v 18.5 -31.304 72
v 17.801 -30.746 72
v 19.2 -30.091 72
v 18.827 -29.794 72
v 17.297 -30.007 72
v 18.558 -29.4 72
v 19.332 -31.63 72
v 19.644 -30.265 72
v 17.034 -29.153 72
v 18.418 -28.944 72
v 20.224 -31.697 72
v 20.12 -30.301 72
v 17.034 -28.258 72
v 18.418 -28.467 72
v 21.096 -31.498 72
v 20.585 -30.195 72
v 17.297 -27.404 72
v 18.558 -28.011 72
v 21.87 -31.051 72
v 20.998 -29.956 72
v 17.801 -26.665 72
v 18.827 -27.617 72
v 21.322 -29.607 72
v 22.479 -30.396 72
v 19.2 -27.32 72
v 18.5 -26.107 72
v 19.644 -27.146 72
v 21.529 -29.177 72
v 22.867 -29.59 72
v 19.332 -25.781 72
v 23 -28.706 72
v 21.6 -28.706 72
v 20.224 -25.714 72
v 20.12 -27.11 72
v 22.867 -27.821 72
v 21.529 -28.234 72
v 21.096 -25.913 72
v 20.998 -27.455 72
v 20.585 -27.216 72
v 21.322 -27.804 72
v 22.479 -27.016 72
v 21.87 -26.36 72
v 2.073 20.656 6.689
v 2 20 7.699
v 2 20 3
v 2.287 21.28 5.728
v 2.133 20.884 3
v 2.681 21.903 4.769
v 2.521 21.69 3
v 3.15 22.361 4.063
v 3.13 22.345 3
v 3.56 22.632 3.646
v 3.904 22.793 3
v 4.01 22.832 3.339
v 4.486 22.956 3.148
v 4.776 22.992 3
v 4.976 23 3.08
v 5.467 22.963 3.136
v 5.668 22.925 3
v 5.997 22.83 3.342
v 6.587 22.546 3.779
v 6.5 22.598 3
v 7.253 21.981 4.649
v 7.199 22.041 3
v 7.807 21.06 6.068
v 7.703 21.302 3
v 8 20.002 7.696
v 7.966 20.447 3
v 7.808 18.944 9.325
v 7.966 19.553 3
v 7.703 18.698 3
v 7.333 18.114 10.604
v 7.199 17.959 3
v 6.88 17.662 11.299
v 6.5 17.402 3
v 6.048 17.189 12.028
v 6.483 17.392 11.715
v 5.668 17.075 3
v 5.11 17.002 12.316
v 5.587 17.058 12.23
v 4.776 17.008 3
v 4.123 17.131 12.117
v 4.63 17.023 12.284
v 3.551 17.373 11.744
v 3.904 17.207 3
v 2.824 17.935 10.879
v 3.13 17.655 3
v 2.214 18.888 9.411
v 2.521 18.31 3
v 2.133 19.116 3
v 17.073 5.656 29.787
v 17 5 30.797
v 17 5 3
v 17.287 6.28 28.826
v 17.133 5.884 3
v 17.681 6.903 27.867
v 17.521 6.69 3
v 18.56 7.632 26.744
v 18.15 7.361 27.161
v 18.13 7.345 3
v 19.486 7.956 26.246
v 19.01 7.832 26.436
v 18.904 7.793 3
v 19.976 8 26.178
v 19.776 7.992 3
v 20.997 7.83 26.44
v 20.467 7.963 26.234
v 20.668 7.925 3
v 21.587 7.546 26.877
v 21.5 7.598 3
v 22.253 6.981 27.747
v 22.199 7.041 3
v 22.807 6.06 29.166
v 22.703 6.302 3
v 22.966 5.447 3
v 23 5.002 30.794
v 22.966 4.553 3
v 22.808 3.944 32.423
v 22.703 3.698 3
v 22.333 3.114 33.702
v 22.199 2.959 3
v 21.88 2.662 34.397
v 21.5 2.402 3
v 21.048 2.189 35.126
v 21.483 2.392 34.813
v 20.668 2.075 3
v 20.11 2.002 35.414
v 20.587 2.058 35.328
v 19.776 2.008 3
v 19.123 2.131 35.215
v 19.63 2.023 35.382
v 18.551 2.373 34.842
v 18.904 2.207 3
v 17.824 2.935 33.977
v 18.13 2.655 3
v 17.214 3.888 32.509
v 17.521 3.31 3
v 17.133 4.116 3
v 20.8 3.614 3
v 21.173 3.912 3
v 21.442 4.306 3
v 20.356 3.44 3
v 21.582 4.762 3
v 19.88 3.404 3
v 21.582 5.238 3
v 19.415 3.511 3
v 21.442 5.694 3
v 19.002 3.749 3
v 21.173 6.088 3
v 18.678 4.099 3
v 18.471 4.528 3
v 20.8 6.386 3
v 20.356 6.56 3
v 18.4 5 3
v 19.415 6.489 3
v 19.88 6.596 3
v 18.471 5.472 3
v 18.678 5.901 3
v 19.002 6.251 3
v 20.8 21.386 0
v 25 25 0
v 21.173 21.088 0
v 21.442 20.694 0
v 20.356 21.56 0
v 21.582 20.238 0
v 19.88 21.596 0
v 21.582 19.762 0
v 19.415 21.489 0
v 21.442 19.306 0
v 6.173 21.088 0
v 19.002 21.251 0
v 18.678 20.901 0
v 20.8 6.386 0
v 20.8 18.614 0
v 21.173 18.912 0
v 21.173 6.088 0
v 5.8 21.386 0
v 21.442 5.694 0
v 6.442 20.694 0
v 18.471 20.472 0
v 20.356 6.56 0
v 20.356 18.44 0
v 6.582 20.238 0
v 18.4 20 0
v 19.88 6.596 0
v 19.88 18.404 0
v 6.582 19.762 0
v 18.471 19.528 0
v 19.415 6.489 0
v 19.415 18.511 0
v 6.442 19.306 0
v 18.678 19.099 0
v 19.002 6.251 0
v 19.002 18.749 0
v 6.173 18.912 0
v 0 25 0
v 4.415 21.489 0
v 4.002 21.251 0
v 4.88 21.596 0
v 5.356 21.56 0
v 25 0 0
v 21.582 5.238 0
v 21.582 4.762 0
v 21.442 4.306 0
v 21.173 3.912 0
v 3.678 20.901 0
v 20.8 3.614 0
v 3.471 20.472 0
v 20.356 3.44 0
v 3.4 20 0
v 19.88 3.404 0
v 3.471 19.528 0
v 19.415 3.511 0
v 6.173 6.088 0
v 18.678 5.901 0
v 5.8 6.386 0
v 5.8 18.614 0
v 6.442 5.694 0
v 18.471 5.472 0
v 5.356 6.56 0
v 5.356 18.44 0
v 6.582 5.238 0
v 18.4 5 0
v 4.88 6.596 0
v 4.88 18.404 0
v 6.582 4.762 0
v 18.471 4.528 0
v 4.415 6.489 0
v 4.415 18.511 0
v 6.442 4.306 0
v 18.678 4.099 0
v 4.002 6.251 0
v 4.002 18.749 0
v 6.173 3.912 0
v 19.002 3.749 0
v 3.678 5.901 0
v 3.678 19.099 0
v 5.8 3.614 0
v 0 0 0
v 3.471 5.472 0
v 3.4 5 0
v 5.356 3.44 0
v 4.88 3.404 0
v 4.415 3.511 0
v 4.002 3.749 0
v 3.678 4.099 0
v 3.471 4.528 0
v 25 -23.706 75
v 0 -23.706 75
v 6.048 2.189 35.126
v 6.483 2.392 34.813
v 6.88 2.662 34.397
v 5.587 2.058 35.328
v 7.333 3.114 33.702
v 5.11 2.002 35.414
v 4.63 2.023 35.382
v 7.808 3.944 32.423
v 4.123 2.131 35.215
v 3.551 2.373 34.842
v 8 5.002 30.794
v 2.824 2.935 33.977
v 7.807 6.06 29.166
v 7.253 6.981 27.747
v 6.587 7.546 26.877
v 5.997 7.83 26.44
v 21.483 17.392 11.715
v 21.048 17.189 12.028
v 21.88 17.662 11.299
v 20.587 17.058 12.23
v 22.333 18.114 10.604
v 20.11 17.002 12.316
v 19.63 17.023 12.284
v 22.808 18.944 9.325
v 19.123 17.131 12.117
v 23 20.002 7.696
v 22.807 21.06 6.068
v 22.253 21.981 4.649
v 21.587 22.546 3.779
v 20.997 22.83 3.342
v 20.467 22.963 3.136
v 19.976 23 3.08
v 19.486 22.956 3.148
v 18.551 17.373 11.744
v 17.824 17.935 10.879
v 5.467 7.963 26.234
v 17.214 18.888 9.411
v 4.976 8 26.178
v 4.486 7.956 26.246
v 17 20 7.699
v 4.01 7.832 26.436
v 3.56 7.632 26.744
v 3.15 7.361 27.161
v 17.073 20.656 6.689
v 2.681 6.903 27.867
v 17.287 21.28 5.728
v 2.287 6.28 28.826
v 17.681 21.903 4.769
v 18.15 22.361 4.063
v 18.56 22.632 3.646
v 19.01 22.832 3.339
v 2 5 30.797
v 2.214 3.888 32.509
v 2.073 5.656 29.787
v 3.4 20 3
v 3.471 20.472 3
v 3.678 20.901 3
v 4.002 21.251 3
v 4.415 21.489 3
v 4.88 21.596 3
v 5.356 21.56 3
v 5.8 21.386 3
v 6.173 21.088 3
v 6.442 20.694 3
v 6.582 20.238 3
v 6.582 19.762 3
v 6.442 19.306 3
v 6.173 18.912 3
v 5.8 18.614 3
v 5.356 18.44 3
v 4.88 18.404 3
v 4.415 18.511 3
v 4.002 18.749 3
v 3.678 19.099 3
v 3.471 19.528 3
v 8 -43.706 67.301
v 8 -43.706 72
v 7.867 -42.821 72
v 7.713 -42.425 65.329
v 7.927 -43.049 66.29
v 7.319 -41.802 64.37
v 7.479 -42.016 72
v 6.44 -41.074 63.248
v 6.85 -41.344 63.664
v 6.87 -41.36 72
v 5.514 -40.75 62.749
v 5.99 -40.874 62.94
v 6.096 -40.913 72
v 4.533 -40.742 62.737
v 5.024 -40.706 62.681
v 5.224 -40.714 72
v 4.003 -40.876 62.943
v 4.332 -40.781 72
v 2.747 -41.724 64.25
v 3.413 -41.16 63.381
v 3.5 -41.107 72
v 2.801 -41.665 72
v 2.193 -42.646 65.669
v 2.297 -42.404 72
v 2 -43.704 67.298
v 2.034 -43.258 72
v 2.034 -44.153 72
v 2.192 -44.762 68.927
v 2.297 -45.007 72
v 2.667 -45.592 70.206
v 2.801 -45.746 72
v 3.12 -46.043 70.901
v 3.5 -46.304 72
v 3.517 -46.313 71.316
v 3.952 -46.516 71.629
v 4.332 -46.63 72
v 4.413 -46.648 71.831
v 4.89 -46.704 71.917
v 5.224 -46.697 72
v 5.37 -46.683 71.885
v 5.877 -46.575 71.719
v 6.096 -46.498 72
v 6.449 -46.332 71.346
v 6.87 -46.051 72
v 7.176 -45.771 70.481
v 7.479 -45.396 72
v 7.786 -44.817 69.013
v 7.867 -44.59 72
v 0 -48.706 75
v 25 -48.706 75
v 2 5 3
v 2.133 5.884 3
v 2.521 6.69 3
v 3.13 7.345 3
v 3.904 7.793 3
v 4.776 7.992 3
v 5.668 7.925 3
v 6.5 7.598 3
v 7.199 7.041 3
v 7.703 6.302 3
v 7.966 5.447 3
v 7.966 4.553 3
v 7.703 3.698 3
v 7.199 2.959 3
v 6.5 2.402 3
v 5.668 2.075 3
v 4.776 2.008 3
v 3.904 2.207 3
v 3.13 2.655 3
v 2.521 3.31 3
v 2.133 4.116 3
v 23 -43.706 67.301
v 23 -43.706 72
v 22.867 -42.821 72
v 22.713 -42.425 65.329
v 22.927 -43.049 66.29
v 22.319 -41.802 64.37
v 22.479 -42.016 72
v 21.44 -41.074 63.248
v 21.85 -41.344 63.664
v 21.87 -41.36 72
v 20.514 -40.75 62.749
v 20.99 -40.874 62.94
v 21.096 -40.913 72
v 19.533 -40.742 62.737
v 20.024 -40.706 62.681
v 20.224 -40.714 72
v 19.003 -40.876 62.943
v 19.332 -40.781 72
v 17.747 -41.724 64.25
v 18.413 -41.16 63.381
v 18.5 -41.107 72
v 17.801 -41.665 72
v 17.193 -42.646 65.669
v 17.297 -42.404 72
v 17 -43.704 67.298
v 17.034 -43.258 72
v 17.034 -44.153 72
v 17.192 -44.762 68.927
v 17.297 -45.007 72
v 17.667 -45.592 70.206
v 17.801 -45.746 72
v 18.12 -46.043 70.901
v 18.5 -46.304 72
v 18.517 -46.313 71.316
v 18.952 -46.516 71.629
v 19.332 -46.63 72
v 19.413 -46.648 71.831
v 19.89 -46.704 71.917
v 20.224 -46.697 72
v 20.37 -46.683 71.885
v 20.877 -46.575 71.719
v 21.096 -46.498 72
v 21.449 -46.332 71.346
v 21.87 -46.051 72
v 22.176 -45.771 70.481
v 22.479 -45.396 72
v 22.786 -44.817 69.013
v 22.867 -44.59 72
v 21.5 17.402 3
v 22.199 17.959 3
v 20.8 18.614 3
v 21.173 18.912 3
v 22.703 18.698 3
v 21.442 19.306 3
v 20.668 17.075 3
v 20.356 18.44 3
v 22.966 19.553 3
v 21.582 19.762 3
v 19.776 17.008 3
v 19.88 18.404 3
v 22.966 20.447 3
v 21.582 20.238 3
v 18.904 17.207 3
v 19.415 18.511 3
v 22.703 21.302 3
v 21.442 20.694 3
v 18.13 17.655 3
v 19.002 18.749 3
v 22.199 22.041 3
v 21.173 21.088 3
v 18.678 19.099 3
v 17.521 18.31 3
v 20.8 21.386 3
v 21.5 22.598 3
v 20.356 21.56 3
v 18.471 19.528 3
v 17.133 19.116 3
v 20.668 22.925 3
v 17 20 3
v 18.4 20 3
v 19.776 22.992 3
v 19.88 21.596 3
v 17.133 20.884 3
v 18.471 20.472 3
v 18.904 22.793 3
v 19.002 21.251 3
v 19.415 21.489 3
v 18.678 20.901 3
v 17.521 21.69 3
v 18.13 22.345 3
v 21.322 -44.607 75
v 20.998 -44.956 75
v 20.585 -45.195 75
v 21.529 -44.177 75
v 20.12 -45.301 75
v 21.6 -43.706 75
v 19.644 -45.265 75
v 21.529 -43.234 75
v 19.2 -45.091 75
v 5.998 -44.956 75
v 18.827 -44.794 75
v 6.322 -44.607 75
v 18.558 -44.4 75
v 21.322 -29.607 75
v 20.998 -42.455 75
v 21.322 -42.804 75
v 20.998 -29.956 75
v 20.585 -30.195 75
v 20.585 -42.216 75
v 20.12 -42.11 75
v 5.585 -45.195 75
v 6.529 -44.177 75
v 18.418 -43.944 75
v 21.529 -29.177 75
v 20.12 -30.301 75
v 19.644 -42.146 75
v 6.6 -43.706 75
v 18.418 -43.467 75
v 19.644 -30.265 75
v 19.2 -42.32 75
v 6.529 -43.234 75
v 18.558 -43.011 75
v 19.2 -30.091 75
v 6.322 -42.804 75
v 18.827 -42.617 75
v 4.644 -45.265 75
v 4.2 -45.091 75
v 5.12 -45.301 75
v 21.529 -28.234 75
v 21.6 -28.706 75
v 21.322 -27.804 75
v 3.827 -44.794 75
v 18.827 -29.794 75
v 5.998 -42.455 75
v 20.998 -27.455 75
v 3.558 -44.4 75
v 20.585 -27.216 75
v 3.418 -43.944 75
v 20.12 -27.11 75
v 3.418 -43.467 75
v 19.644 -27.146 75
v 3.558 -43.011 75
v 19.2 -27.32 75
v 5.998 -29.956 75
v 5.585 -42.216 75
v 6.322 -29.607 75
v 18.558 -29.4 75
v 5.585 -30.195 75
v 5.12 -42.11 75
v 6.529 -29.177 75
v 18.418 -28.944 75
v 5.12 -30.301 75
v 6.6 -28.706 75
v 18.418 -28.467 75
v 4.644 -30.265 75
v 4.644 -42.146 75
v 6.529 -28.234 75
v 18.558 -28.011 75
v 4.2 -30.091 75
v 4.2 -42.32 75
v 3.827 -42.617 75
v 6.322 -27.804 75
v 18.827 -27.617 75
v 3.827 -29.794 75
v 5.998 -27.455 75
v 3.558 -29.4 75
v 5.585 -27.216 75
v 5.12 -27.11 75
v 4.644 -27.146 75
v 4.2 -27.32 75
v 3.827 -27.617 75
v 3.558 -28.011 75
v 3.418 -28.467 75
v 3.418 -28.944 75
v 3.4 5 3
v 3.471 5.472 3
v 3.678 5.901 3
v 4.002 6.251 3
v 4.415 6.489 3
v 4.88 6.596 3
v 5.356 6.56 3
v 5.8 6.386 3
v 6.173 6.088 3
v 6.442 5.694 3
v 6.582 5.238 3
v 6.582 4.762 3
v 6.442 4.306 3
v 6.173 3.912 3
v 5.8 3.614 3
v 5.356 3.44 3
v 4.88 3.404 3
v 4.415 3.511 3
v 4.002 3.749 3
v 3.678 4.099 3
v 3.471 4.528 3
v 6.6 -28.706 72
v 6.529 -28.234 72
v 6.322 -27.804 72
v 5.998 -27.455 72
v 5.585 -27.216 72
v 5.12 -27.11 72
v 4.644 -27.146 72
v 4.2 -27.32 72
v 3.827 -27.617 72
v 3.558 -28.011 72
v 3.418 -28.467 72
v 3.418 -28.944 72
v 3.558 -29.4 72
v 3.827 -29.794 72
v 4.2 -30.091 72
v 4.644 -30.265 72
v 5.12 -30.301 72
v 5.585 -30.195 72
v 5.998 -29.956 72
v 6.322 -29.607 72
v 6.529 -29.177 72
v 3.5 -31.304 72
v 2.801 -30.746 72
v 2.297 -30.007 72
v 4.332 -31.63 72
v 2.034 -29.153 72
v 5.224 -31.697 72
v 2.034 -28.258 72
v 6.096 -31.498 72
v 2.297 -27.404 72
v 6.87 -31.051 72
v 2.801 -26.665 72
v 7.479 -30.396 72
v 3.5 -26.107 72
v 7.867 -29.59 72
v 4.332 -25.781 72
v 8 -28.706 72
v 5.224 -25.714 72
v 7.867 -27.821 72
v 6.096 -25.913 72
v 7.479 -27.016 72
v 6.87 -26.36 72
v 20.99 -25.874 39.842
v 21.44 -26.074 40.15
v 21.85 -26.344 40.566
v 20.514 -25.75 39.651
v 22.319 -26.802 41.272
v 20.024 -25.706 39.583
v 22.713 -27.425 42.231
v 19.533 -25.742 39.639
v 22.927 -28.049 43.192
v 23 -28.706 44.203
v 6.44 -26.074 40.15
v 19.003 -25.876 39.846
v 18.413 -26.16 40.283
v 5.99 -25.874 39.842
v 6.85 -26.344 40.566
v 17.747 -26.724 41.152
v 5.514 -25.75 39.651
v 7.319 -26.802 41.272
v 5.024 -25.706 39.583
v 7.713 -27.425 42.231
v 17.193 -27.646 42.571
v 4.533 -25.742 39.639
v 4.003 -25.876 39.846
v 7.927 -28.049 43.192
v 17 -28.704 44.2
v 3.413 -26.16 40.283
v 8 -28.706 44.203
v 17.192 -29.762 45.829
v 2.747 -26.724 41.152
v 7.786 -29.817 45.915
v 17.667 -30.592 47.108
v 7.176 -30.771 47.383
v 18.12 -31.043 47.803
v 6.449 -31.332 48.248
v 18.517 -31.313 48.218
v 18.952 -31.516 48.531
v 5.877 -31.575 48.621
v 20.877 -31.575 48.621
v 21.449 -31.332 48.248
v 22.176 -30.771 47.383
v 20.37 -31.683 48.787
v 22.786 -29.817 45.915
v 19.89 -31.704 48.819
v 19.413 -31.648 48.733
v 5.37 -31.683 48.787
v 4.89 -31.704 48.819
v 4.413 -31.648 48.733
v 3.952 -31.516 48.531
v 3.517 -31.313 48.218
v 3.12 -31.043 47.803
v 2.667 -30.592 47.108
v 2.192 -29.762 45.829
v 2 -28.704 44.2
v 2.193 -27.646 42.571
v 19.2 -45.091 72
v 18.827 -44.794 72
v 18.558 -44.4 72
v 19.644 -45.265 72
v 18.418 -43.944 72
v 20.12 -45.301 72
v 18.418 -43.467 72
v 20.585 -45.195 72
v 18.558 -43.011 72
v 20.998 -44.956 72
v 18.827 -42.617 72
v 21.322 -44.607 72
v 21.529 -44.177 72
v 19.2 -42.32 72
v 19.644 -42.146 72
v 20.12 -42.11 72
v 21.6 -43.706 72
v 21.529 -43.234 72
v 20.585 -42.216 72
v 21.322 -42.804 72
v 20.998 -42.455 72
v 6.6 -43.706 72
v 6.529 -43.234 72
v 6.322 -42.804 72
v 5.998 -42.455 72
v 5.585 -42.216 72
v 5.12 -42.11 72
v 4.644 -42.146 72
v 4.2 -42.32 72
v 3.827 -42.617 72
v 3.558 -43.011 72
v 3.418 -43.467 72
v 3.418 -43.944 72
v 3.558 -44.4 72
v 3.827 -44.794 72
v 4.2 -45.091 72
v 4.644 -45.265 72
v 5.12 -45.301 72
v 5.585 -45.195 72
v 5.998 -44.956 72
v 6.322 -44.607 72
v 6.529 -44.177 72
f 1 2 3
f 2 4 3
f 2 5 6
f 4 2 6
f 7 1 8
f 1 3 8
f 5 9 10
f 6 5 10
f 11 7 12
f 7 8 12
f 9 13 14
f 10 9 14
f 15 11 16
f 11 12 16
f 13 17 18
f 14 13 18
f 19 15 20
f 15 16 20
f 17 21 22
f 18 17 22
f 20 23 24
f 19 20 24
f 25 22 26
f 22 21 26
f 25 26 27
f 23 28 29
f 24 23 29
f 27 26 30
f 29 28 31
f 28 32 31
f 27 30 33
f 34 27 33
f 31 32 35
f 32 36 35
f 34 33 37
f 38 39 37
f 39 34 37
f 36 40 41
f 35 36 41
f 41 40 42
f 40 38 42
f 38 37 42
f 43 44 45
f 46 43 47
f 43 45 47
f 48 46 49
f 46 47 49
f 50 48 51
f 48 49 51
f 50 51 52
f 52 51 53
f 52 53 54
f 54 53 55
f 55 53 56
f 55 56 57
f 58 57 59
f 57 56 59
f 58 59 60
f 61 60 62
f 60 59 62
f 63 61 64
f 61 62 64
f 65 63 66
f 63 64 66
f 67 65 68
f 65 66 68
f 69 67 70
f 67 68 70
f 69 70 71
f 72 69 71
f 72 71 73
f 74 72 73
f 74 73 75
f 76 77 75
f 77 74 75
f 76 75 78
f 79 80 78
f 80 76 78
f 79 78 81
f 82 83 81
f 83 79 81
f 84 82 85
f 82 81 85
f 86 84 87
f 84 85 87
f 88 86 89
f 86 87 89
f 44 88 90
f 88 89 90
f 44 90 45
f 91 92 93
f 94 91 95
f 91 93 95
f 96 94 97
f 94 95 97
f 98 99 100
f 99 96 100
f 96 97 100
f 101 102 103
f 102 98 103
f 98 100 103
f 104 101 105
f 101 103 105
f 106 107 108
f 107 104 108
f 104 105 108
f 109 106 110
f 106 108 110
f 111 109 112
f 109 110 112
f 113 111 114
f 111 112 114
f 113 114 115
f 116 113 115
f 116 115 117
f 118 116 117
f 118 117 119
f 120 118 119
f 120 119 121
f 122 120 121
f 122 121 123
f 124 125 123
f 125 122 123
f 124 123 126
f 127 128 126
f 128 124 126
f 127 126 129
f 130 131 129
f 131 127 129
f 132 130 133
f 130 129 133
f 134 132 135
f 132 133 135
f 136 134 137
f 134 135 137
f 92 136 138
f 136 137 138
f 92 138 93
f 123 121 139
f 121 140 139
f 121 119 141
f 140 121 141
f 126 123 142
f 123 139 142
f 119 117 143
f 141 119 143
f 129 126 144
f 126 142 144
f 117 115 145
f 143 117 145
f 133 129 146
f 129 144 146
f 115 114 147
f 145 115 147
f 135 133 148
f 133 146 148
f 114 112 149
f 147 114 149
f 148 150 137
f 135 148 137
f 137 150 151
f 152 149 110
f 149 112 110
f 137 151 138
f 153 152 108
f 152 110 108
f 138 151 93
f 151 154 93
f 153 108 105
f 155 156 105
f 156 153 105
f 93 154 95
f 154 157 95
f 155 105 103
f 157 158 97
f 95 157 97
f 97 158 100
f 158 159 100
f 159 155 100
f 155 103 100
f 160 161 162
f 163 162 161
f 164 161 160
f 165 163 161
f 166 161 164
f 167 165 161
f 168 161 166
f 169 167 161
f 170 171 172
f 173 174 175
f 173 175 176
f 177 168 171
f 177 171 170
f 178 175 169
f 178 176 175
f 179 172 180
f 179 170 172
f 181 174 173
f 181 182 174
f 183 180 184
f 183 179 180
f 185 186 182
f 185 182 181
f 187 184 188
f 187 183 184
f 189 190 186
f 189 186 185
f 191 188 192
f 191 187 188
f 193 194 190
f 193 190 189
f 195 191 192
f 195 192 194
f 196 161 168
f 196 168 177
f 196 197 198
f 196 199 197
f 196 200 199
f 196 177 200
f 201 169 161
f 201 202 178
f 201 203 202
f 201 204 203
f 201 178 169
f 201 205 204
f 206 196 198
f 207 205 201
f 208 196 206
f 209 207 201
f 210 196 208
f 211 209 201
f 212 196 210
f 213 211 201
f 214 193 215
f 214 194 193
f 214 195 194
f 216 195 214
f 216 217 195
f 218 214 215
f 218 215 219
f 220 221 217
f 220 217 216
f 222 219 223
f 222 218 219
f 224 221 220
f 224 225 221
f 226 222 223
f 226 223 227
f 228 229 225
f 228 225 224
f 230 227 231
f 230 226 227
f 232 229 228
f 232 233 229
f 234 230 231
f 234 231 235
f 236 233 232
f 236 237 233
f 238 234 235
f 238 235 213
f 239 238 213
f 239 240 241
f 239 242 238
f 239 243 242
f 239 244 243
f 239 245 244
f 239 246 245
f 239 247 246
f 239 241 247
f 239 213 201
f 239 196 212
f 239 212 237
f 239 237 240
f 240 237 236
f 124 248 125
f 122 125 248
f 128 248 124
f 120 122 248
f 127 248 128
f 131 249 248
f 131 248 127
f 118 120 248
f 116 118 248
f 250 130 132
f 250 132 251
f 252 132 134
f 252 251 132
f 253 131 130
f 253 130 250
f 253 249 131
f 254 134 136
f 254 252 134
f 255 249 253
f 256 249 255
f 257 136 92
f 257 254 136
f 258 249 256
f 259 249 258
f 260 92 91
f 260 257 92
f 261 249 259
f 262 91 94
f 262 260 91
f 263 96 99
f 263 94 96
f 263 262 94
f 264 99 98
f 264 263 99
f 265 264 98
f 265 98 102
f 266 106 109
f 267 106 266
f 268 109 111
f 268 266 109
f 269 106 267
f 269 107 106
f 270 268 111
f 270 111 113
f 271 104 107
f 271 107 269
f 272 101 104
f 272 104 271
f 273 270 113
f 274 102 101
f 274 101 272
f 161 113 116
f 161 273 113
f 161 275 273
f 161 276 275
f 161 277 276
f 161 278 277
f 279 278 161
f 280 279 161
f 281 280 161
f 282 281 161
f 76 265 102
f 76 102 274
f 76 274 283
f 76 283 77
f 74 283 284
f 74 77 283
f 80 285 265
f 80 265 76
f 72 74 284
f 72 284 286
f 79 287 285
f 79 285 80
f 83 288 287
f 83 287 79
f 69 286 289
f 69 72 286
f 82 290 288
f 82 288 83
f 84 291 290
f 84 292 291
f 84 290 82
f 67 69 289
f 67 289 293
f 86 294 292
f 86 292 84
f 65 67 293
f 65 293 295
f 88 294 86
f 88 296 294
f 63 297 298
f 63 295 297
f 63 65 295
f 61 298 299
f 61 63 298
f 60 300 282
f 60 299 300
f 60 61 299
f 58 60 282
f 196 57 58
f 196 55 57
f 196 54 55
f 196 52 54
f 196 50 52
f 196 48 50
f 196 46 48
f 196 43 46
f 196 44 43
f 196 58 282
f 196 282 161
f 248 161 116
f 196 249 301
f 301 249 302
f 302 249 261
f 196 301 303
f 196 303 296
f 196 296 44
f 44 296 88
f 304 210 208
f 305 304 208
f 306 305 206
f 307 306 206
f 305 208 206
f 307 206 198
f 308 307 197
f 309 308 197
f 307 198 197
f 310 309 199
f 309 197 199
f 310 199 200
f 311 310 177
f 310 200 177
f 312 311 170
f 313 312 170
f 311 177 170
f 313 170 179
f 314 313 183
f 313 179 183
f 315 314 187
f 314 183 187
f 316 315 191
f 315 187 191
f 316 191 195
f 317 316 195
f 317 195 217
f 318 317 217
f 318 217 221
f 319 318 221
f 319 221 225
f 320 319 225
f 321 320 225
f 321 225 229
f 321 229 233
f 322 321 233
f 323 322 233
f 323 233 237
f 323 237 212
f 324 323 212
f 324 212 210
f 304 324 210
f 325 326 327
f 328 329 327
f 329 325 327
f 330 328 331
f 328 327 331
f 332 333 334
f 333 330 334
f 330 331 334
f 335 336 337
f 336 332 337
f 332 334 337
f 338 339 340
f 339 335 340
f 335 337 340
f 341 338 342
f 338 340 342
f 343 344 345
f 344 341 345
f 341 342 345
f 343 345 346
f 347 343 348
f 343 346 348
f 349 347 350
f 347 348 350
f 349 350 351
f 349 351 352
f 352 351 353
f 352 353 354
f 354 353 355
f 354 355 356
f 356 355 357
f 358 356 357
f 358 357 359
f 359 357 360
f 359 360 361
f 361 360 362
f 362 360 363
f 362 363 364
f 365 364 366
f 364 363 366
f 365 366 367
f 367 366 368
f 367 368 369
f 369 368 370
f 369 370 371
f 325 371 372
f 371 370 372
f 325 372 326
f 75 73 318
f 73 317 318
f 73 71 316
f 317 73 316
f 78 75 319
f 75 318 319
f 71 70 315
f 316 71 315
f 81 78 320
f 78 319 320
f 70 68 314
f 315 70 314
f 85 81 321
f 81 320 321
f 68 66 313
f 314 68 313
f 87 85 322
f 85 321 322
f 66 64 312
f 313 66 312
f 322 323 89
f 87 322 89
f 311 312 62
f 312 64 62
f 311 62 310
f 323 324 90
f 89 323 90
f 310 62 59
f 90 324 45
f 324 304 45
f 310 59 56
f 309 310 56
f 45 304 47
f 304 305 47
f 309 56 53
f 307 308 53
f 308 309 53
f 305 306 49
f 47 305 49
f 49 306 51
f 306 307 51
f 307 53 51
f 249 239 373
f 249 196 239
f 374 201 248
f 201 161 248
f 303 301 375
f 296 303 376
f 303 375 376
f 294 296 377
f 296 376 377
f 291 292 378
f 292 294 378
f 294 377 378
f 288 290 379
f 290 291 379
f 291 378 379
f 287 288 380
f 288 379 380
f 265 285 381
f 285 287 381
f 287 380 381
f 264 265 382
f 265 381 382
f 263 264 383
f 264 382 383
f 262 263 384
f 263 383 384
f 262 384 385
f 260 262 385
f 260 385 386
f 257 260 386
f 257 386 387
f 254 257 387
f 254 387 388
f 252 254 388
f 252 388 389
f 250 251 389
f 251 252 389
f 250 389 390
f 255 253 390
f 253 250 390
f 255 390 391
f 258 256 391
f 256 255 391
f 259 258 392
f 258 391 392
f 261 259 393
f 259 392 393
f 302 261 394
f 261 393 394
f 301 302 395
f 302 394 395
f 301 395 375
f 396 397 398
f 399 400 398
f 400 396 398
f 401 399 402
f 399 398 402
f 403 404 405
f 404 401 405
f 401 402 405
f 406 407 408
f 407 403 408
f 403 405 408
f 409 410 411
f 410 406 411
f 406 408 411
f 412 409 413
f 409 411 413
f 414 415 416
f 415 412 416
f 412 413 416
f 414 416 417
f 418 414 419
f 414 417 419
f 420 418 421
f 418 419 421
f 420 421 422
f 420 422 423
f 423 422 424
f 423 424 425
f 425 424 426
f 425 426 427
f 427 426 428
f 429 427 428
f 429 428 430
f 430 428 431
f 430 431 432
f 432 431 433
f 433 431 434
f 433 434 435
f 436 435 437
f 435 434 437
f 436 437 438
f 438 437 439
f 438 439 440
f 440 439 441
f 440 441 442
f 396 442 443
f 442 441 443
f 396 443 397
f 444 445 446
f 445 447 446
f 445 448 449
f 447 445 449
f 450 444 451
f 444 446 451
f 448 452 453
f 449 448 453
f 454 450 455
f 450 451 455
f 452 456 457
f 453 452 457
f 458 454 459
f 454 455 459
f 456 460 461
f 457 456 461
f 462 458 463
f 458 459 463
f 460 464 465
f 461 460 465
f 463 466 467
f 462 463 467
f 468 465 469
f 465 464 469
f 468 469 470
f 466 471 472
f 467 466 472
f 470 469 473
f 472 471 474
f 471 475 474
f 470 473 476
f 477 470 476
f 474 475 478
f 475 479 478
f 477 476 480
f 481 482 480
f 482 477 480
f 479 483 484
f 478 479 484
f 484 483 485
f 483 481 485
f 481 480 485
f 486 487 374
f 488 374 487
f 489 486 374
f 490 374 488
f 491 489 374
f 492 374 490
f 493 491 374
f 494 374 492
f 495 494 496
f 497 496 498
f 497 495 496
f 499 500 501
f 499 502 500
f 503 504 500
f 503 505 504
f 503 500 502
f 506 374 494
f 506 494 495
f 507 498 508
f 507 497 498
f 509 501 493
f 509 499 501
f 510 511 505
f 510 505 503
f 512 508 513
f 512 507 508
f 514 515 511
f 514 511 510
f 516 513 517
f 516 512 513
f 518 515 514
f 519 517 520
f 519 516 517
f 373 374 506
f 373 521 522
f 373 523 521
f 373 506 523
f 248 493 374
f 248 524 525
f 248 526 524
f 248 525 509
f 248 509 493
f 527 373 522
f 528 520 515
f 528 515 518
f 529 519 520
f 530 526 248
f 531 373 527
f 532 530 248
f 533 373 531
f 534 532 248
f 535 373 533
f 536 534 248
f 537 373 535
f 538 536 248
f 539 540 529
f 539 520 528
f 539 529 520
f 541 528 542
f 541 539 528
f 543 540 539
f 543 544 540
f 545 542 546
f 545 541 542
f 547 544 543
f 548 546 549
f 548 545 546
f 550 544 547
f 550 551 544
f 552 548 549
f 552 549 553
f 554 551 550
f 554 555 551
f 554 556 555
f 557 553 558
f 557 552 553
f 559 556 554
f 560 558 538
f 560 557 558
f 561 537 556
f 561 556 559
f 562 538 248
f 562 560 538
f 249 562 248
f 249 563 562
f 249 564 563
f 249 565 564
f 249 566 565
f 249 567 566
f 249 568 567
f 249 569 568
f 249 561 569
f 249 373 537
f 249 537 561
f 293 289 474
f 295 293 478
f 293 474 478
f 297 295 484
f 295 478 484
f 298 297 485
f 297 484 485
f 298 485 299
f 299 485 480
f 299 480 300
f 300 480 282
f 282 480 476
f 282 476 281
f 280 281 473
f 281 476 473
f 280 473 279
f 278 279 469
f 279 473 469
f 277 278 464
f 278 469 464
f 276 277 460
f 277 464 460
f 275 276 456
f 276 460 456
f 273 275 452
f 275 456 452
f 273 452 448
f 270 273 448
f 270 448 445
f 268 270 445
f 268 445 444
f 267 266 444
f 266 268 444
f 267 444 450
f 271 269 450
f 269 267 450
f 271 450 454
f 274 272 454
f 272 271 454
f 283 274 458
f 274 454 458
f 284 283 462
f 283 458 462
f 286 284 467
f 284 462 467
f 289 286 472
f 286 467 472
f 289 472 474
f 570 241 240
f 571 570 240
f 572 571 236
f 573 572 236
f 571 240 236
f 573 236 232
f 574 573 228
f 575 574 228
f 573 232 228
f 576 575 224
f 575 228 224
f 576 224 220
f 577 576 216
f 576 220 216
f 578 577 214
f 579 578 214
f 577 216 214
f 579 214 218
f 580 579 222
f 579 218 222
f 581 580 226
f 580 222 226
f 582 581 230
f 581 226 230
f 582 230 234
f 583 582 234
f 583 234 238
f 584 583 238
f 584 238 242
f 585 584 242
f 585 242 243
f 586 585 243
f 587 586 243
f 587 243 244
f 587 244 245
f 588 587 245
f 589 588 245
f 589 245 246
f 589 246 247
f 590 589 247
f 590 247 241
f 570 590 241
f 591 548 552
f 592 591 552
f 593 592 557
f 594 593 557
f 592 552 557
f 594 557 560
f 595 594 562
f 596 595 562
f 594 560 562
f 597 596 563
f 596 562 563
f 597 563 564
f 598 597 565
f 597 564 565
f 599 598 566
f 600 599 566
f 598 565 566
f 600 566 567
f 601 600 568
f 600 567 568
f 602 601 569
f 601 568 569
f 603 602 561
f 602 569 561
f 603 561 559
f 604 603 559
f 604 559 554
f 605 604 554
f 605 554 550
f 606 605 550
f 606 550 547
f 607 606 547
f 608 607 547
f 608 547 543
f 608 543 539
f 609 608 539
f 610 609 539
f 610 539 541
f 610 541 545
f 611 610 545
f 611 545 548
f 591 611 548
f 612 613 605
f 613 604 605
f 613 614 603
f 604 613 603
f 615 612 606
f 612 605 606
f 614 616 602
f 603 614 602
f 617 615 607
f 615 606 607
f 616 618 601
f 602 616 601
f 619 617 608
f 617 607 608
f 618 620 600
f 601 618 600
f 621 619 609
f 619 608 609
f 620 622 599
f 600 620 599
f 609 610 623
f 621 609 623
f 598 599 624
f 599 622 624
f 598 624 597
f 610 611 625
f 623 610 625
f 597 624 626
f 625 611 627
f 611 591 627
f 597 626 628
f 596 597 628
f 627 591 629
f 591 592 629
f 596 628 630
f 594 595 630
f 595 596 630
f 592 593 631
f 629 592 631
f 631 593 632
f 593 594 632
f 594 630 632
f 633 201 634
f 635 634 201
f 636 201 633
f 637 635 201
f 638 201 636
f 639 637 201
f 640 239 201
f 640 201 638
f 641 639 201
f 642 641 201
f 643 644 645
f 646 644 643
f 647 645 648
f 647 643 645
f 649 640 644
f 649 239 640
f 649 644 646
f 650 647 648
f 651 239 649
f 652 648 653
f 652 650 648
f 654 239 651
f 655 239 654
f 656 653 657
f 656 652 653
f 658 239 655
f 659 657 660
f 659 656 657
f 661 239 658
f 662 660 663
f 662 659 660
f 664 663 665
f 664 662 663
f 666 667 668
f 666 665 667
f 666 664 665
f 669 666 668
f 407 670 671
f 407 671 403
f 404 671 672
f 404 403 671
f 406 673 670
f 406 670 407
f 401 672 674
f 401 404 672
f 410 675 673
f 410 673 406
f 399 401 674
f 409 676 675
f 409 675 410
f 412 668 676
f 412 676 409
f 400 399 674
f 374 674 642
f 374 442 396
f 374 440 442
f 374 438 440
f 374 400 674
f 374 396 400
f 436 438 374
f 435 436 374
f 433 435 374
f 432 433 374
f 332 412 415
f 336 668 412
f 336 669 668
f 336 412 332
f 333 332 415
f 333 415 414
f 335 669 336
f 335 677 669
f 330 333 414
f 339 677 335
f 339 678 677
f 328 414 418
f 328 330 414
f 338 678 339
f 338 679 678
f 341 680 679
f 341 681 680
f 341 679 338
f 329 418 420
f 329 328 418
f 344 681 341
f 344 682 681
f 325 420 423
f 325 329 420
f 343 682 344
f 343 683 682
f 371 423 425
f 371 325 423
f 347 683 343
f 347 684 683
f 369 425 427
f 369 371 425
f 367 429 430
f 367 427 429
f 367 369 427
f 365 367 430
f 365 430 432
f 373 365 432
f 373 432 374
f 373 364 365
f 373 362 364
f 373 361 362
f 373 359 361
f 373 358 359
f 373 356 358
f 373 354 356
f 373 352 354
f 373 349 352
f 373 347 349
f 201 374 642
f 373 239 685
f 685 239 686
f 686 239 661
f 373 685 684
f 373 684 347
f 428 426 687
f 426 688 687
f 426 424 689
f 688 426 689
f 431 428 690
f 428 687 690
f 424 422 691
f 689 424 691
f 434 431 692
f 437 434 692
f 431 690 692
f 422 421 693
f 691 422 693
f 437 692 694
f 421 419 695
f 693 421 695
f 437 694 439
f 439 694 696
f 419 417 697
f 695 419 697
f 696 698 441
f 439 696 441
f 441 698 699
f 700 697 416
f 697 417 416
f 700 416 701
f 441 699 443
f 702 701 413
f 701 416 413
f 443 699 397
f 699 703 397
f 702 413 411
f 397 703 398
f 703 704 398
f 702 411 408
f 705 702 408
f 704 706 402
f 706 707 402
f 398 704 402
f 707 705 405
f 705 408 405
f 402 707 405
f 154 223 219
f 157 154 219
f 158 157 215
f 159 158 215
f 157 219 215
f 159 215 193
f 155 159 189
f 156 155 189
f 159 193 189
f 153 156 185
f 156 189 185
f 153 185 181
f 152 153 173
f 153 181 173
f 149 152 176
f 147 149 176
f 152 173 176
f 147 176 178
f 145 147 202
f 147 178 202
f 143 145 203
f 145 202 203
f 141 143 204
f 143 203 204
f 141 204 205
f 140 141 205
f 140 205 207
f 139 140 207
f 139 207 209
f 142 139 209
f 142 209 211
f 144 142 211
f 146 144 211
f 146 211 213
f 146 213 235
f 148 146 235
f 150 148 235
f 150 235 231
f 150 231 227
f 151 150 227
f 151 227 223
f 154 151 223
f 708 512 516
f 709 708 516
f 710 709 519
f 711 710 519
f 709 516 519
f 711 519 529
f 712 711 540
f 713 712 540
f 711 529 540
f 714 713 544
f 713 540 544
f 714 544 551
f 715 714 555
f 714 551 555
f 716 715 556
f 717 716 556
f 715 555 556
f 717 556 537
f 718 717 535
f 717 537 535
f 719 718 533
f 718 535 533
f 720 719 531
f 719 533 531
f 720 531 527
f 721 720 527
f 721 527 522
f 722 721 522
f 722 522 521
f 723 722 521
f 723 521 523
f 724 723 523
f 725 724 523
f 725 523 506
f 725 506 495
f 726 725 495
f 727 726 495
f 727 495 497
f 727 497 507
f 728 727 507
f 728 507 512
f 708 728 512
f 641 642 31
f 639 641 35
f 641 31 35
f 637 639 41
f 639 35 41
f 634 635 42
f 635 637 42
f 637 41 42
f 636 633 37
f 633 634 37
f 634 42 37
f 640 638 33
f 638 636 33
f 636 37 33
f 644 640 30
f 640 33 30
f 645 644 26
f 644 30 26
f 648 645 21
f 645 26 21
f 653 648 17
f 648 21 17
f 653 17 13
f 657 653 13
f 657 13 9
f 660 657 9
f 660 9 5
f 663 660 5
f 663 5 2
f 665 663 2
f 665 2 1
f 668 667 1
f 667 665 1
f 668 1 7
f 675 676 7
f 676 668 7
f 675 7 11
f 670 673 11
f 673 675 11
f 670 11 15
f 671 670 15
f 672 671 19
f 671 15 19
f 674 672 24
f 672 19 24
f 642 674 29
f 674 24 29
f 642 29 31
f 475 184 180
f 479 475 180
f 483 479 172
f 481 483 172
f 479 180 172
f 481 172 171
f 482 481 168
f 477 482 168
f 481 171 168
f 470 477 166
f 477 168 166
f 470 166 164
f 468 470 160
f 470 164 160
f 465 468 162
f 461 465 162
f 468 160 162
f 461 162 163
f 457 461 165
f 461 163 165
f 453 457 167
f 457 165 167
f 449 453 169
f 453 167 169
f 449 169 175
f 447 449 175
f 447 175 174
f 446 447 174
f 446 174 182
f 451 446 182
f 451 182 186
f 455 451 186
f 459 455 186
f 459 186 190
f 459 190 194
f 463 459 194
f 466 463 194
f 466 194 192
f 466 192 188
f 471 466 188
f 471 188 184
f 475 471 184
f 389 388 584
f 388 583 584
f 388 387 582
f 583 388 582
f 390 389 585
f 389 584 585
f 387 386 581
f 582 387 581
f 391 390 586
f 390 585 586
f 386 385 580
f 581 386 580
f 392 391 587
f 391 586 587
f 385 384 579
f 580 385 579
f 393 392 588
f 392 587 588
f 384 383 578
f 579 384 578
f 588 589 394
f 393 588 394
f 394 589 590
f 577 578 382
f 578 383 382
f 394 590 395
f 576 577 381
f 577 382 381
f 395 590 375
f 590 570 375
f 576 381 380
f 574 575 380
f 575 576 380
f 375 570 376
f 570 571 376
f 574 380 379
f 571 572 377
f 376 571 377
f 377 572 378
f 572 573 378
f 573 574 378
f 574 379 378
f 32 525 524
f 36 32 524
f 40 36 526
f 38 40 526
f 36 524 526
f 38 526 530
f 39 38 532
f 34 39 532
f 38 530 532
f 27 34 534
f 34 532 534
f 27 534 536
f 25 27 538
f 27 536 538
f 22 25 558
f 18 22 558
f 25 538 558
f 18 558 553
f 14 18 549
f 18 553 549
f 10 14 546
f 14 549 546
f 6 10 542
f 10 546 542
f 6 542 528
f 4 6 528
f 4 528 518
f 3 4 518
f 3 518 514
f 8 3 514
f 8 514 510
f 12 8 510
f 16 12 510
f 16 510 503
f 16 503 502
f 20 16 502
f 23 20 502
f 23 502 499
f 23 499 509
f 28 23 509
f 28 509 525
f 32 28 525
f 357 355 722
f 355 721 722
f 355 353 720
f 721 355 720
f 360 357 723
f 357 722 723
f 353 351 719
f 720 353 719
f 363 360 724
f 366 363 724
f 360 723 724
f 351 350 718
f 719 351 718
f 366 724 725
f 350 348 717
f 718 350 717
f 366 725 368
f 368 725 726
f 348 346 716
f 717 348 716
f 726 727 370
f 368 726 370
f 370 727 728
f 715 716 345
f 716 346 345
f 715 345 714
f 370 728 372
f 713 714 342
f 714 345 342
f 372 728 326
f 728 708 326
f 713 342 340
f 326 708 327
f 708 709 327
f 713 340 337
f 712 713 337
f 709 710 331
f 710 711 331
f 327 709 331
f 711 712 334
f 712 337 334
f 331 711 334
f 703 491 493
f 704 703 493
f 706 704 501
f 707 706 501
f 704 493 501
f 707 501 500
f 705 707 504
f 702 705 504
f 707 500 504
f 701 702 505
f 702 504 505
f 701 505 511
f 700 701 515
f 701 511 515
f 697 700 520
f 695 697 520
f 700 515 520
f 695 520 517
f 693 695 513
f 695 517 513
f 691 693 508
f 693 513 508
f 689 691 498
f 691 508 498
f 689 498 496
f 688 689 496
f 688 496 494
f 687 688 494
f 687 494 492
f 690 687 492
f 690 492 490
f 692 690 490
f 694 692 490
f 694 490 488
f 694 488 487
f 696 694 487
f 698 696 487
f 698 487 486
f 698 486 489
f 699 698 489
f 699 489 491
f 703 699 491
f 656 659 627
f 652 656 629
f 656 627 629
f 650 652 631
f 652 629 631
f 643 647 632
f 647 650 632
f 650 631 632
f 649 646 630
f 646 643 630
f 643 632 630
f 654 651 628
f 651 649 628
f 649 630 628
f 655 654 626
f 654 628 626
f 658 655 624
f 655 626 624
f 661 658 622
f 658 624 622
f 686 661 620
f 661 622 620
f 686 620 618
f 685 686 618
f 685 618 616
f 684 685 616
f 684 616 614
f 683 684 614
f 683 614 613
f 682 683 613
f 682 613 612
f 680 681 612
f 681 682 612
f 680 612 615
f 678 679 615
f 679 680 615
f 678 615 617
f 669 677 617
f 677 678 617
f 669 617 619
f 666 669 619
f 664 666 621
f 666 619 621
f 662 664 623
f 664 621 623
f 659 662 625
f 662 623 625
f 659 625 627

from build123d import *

# Parameters (mm, degrees)
BOSS_EXTRUDE1_DEPTH = 25
CUT_EXTRUDE7_REACH  = 97.856
CUT_EXTRUDE7_START  = -3
SKETCH3_R           = 3
SKETCH3_R_2         = 1.6
CUT_EXTRUDE8_REACH  = 94.856
SKETCH3_3_R         = 1.6
CUT_EXTRUDE9_REACH  = 97.856
CUT_EXTRUDE9_START  = -3
SKETCH4_R           = 3
SKETCH4_R_2         = 1.6
CUT_EXTRUDE10_REACH = 94.856
SKETCH4_2_R         = 1.6


with BuildPart() as part:
    # Sketch1 → Boss-Extrude1 (new body)
    with BuildSketch(Plane(origin=(0, 0, 0), x_dir=(0, 0, -1), z_dir=(1, 0, 0))):
        Polygon((0, 0), (-75, -48.70556949), (-75, -23.70556949), (0, 25), align=None)
    extrude(amount=BOSS_EXTRUDE1_DEPTH)

    # Sketch3 → Cut-Extrude7 (cut, up to next)
    with BuildSketch(Plane(origin=(0, 0, 0), x_dir=(-1, 0, 0), z_dir=(0, 0, -1)).offset(CUT_EXTRUDE7_START), mode=Mode.PRIVATE) as cut_extrude7_sk1:
        with Locations((-20, 20)):
            Circle(SKETCH3_R)
        with Locations((-20, 20)):
            Circle(SKETCH3_R_2, mode=Mode.SUBTRACT)
    cut_extrude7_tool1 = extrude(cut_extrude7_sk1.sketch, amount=-CUT_EXTRUDE7_REACH, mode=Mode.PRIVATE) & part.part
    # Sketch3 → Cut-Extrude7 (cut, up to next)
    with BuildSketch(Plane(origin=(0, 0, 0), x_dir=(-1, 0, 0), z_dir=(0, 0, -1)).offset(CUT_EXTRUDE7_START), mode=Mode.PRIVATE) as cut_extrude7_sk2:
        with Locations((-20, 5)):
            Circle(SKETCH3_R)
        with Locations((-20, 5)):
            Circle(SKETCH3_R_2, mode=Mode.SUBTRACT)
    cut_extrude7_tool2 = extrude(cut_extrude7_sk2.sketch, amount=-CUT_EXTRUDE7_REACH, mode=Mode.PRIVATE) & part.part
    # Sketch3 → Cut-Extrude7 (cut, up to next)
    with BuildSketch(Plane(origin=(0, 0, 0), x_dir=(-1, 0, 0), z_dir=(0, 0, -1)).offset(CUT_EXTRUDE7_START), mode=Mode.PRIVATE) as cut_extrude7_sk3:
        with Locations((-5, 5)):
            Circle(SKETCH3_R)
        with Locations((-5, 5)):
            Circle(SKETCH3_R_2, mode=Mode.SUBTRACT)
    cut_extrude7_tool3 = extrude(cut_extrude7_sk3.sketch, amount=-CUT_EXTRUDE7_REACH, mode=Mode.PRIVATE) & part.part
    # Sketch3 → Cut-Extrude7 (cut, up to next)
    with BuildSketch(Plane(origin=(0, 0, 0), x_dir=(-1, 0, 0), z_dir=(0, 0, -1)).offset(CUT_EXTRUDE7_START), mode=Mode.PRIVATE) as cut_extrude7_sk4:
        with Locations((-5, 20)):
            Circle(SKETCH3_R)
        with Locations((-5, 20)):
            Circle(SKETCH3_R_2, mode=Mode.SUBTRACT)
    cut_extrude7_tool4 = extrude(cut_extrude7_sk4.sketch, amount=-CUT_EXTRUDE7_REACH, mode=Mode.PRIVATE) & part.part
    add(cut_extrude7_tool1.solids().sort_by_distance((22.915147, 20, 3))[0], mode=Mode.SUBTRACT)
    add(cut_extrude7_tool2.solids().sort_by_distance((22.915147, 5, 3))[0], mode=Mode.SUBTRACT)
    add(cut_extrude7_tool3.solids().sort_by_distance((7.915147, 5, 3))[0], mode=Mode.SUBTRACT)
    add(cut_extrude7_tool4.solids().sort_by_distance((7.915147, 20, 3))[0], mode=Mode.SUBTRACT)

    # Sketch3<3> → Cut-Extrude8 (cut, up to next)
    with BuildSketch(Plane(origin=(0, 0, 0), x_dir=(-1, 0, 0), z_dir=(0, 0, -1)), mode=Mode.PRIVATE) as cut_extrude8_sk1:
        with Locations((-20, 20)):
            Circle(SKETCH3_3_R)
    cut_extrude8_tool1 = extrude(cut_extrude8_sk1.sketch, amount=-CUT_EXTRUDE8_REACH, mode=Mode.PRIVATE) & part.part
    # Sketch3<3> → Cut-Extrude8 (cut, up to next)
    with BuildSketch(Plane(origin=(0, 0, 0), x_dir=(-1, 0, 0), z_dir=(0, 0, -1)), mode=Mode.PRIVATE) as cut_extrude8_sk2:
        with Locations((-20, 5)):
            Circle(SKETCH3_3_R)
    cut_extrude8_tool2 = extrude(cut_extrude8_sk2.sketch, amount=-CUT_EXTRUDE8_REACH, mode=Mode.PRIVATE) & part.part
    # Sketch3<3> → Cut-Extrude8 (cut, up to next)
    with BuildSketch(Plane(origin=(0, 0, 0), x_dir=(-1, 0, 0), z_dir=(0, 0, -1)), mode=Mode.PRIVATE) as cut_extrude8_sk3:
        with Locations((-5, 5)):
            Circle(SKETCH3_3_R)
    cut_extrude8_tool3 = extrude(cut_extrude8_sk3.sketch, amount=-CUT_EXTRUDE8_REACH, mode=Mode.PRIVATE) & part.part
    # Sketch3<3> → Cut-Extrude8 (cut, up to next)
    with BuildSketch(Plane(origin=(0, 0, 0), x_dir=(-1, 0, 0), z_dir=(0, 0, -1)), mode=Mode.PRIVATE) as cut_extrude8_sk4:
        with Locations((-5, 20)):
            Circle(SKETCH3_3_R)
    cut_extrude8_tool4 = extrude(cut_extrude8_sk4.sketch, amount=-CUT_EXTRUDE8_REACH, mode=Mode.PRIVATE) & part.part
    add(cut_extrude8_tool1.solids().sort_by_distance((20, 20, 0))[0], mode=Mode.SUBTRACT)
    add(cut_extrude8_tool2.solids().sort_by_distance((20, 5, 0))[0], mode=Mode.SUBTRACT)
    add(cut_extrude8_tool3.solids().sort_by_distance((5, 5, 0))[0], mode=Mode.SUBTRACT)
    add(cut_extrude8_tool4.solids().sort_by_distance((5, 20, 0))[0], mode=Mode.SUBTRACT)

    # Sketch4 → Cut-Extrude9 (cut, up to next)
    with BuildSketch(Plane.XY.offset(75).offset(CUT_EXTRUDE9_START), mode=Mode.PRIVATE) as cut_extrude9_sk1:
        with Locations((5, -28.70556949)):
            Circle(SKETCH4_R)
        with Locations((5, -28.70556949)):
            Circle(SKETCH4_R_2, mode=Mode.SUBTRACT)
    cut_extrude9_tool1 = extrude(cut_extrude9_sk1.sketch, amount=-CUT_EXTRUDE9_REACH, mode=Mode.PRIVATE) & part.part
    # Sketch4 → Cut-Extrude9 (cut, up to next)
    with BuildSketch(Plane.XY.offset(75).offset(CUT_EXTRUDE9_START), mode=Mode.PRIVATE) as cut_extrude9_sk2:
        with Locations((5, -43.70556949)):
            Circle(SKETCH4_R)
        with Locations((5, -43.70556949)):
            Circle(SKETCH4_R_2, mode=Mode.SUBTRACT)
    cut_extrude9_tool2 = extrude(cut_extrude9_sk2.sketch, amount=-CUT_EXTRUDE9_REACH, mode=Mode.PRIVATE) & part.part
    # Sketch4 → Cut-Extrude9 (cut, up to next)
    with BuildSketch(Plane.XY.offset(75).offset(CUT_EXTRUDE9_START), mode=Mode.PRIVATE) as cut_extrude9_sk3:
        with Locations((20, -43.70556949)):
            Circle(SKETCH4_R)
        with Locations((20, -43.70556949)):
            Circle(SKETCH4_R_2, mode=Mode.SUBTRACT)
    cut_extrude9_tool3 = extrude(cut_extrude9_sk3.sketch, amount=-CUT_EXTRUDE9_REACH, mode=Mode.PRIVATE) & part.part
    # Sketch4 → Cut-Extrude9 (cut, up to next)
    with BuildSketch(Plane.XY.offset(75).offset(CUT_EXTRUDE9_START), mode=Mode.PRIVATE) as cut_extrude9_sk4:
        with Locations((20, -28.70556949)):
            Circle(SKETCH4_R)
        with Locations((20, -28.70556949)):
            Circle(SKETCH4_R_2, mode=Mode.SUBTRACT)
    cut_extrude9_tool4 = extrude(cut_extrude9_sk4.sketch, amount=-CUT_EXTRUDE9_REACH, mode=Mode.PRIVATE) & part.part
    add(cut_extrude9_tool1.solids().sort_by_distance((2.084853, -28.705569, 72))[0], mode=Mode.SUBTRACT)
    add(cut_extrude9_tool2.solids().sort_by_distance((2.084853, -43.705569, 72))[0], mode=Mode.SUBTRACT)
    add(cut_extrude9_tool3.solids().sort_by_distance((17.084853, -43.705569, 72))[0], mode=Mode.SUBTRACT)
    add(cut_extrude9_tool4.solids().sort_by_distance((17.084853, -28.705569, 72))[0], mode=Mode.SUBTRACT)

    # Sketch4<2> → Cut-Extrude10 (cut, up to next)
    with BuildSketch(Plane.XY.offset(75), mode=Mode.PRIVATE) as cut_extrude10_sk1:
        with Locations((5, -28.70556949)):
            Circle(SKETCH4_2_R)
    cut_extrude10_tool1 = extrude(cut_extrude10_sk1.sketch, amount=-CUT_EXTRUDE10_REACH, mode=Mode.PRIVATE) & part.part
    # Sketch4<2> → Cut-Extrude10 (cut, up to next)
    with BuildSketch(Plane.XY.offset(75), mode=Mode.PRIVATE) as cut_extrude10_sk2:
        with Locations((5, -43.70556949)):
            Circle(SKETCH4_2_R)
    cut_extrude10_tool2 = extrude(cut_extrude10_sk2.sketch, amount=-CUT_EXTRUDE10_REACH, mode=Mode.PRIVATE) & part.part
    # Sketch4<2> → Cut-Extrude10 (cut, up to next)
    with BuildSketch(Plane.XY.offset(75), mode=Mode.PRIVATE) as cut_extrude10_sk3:
        with Locations((20, -43.70556949)):
            Circle(SKETCH4_2_R)
    cut_extrude10_tool3 = extrude(cut_extrude10_sk3.sketch, amount=-CUT_EXTRUDE10_REACH, mode=Mode.PRIVATE) & part.part
    # Sketch4<2> → Cut-Extrude10 (cut, up to next)
    with BuildSketch(Plane.XY.offset(75), mode=Mode.PRIVATE) as cut_extrude10_sk4:
        with Locations((20, -28.70556949)):
            Circle(SKETCH4_2_R)
    cut_extrude10_tool4 = extrude(cut_extrude10_sk4.sketch, amount=-CUT_EXTRUDE10_REACH, mode=Mode.PRIVATE) & part.part
    add(cut_extrude10_tool1.solids().sort_by_distance((5, -28.705569, 75))[0], mode=Mode.SUBTRACT)
    add(cut_extrude10_tool2.solids().sort_by_distance((5, -43.705569, 75))[0], mode=Mode.SUBTRACT)
    add(cut_extrude10_tool3.solids().sort_by_distance((20, -43.705569, 75))[0], mode=Mode.SUBTRACT)
    add(cut_extrude10_tool4.solids().sort_by_distance((20, -28.705569, 75))[0], mode=Mode.SUBTRACT)


solid = part.part
